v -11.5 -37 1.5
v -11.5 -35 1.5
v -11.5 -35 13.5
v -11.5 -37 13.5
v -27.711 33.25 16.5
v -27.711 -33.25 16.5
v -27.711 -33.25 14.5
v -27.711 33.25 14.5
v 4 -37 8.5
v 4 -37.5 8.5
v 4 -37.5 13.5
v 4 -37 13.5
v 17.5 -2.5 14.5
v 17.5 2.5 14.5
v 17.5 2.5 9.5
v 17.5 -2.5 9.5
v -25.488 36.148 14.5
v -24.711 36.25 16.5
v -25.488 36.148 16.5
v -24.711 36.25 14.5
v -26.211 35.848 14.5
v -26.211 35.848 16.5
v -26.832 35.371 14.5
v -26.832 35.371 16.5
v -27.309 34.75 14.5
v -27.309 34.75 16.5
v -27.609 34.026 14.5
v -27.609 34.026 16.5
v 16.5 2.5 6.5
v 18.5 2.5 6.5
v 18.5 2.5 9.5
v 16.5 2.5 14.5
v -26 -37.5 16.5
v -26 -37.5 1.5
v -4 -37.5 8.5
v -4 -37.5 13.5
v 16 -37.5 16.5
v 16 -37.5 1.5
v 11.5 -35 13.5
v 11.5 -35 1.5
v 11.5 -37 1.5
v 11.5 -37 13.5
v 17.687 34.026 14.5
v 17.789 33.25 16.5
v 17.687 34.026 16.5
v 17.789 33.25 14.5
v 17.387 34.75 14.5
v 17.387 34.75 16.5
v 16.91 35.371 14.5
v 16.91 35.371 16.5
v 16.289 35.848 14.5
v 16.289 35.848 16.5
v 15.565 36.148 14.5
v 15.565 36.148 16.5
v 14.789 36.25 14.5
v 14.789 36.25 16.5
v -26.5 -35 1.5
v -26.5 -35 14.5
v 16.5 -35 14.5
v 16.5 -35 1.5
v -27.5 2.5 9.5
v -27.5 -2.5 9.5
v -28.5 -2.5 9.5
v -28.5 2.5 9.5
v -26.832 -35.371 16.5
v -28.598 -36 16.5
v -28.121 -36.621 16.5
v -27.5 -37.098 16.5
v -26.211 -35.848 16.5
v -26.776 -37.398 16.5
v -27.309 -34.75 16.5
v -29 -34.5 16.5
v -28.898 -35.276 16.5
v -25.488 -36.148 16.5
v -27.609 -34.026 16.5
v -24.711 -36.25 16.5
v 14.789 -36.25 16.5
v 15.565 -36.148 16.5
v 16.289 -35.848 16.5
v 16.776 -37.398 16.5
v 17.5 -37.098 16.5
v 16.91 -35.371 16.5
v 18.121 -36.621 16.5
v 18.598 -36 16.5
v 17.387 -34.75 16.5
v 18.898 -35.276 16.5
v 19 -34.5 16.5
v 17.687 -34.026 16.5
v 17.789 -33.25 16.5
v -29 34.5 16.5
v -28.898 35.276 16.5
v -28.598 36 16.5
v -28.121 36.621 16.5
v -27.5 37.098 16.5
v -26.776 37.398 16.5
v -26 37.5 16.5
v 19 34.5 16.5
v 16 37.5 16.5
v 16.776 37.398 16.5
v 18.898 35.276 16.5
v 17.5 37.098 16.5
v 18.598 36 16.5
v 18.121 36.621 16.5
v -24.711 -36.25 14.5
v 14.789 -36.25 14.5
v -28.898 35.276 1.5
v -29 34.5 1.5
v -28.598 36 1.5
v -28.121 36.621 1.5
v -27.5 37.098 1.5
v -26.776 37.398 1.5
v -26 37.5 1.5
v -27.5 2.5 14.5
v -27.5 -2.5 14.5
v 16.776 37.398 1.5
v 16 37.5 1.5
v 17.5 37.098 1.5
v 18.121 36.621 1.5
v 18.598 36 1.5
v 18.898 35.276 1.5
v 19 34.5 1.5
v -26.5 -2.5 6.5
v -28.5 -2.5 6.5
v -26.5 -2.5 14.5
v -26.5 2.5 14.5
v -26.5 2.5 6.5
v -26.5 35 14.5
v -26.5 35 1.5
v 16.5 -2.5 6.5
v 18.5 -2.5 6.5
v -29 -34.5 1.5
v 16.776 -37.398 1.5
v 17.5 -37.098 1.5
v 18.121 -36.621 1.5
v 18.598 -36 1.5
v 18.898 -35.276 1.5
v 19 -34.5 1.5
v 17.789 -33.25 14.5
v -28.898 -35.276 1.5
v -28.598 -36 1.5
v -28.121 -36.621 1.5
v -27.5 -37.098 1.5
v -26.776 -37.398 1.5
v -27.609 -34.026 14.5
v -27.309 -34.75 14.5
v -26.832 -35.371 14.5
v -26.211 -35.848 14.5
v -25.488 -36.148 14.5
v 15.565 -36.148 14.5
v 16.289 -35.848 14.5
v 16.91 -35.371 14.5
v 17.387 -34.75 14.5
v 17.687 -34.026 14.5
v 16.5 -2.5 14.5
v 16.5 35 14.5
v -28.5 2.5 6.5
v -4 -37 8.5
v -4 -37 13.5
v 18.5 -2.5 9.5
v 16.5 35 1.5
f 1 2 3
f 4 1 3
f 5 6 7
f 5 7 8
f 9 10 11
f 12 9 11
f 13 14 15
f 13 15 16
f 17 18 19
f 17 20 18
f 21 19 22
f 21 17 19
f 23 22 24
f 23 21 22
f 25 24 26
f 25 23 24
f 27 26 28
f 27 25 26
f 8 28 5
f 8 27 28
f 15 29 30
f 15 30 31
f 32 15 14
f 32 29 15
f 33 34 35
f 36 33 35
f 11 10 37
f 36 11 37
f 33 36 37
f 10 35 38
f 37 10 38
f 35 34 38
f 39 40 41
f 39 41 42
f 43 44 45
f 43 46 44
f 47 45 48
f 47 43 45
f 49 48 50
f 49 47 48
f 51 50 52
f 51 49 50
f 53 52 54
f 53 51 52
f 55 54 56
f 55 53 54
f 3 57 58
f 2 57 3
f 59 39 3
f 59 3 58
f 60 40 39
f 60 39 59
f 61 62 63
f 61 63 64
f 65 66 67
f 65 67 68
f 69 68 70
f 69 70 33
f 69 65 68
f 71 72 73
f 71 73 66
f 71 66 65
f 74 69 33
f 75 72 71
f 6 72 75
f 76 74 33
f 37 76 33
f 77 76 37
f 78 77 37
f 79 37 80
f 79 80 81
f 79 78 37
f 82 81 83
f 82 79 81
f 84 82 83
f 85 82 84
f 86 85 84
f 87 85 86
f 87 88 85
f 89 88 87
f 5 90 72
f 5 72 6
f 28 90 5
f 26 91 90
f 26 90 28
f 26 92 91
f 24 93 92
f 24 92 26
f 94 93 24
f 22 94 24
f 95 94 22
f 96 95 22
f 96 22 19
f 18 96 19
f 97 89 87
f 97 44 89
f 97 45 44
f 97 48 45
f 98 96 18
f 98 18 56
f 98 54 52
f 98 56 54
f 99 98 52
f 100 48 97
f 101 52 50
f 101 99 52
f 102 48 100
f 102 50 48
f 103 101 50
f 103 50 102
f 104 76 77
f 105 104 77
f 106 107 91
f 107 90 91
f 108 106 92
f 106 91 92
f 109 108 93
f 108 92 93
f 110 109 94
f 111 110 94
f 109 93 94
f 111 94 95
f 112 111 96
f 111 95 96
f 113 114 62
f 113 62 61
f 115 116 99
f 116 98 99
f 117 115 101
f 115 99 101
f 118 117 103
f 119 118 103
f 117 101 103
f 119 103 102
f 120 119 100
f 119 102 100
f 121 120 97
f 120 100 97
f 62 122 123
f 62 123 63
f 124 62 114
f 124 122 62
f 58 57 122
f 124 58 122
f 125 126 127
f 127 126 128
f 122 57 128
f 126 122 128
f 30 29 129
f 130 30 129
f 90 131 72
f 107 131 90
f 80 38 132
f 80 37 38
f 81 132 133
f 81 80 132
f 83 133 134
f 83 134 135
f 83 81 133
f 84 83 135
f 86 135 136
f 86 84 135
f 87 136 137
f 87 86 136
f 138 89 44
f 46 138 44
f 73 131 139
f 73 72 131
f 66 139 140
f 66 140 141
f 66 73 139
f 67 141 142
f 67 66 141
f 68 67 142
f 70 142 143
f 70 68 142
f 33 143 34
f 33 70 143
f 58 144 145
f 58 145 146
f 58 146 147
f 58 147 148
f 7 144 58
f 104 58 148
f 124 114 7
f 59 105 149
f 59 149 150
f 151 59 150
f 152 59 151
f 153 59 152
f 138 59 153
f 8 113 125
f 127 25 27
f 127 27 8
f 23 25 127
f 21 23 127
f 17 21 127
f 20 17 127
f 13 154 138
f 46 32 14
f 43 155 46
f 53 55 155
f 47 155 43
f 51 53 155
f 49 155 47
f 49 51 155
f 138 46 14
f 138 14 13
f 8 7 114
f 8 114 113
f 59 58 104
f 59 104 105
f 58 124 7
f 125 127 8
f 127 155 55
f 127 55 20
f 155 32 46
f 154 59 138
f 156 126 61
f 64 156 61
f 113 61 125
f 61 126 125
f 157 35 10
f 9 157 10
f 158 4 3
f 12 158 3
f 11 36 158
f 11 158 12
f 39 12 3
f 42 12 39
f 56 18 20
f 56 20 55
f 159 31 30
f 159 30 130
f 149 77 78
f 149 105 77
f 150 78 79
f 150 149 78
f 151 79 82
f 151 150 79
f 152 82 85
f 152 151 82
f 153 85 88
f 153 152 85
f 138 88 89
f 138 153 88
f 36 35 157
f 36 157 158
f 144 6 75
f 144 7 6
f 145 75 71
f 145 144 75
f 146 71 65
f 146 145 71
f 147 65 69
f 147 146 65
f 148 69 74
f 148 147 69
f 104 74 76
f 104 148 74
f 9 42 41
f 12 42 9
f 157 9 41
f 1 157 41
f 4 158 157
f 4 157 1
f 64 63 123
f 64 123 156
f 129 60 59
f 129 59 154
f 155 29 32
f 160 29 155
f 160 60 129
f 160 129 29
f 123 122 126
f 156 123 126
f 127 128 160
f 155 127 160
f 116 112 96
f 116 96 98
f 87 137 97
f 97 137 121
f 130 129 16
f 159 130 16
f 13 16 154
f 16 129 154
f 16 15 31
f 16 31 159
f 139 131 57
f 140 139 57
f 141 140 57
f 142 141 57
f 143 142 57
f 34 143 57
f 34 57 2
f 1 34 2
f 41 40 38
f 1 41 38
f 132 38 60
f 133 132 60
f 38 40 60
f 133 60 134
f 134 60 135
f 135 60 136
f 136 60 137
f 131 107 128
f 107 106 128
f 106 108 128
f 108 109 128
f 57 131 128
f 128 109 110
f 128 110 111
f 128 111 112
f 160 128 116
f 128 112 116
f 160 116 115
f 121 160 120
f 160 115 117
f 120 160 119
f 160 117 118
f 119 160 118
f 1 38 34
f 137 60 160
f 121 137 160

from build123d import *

# Parameters (mm, degrees)
SKETCH004_W     = 48
SKETCH004_H     = 75
SKETCH004_W_2   = 43
SKETCH004_H_2   = 70
PAD002_DEPTH    = 15
SKETCH005_W     = 45.5
SKETCH005_H     = 72.5
POCKET_DEPTH    = 2
FILLET_R        = 3
FILLET001_R     = 3
FILLET002_R     = 3
FILLET003_R     = 3
FILLET004_R     = 3
FILLET005_R     = 3
SKETCH006_W     = 5
SKETCH006_H     = 5
POCKET001_DEPTH = 1
SKETCH007_W     = 5
SKETCH007_H     = 3
POCKET002_DEPTH = 2
SKETCH008_W     = 5
SKETCH008_H     = 5
POCKET003_DEPTH = 1
SKETCH009_W     = 5
SKETCH009_H     = 3
POCKET004_DEPTH = 2
SKETCH011_W     = 23
SKETCH011_H     = 12
POCKET006_DEPTH = 2
SKETCH013_W     = 8
SKETCH013_H     = 5
POCKET008_DEPTH = 5


with BuildPart() as part:
    # Sketch004 → Pad002 (new body)
    with BuildSketch(Plane.XY.offset(1.5)):
        with Locations((-5, 0)):
            Rectangle(SKETCH004_W, SKETCH004_H)
        with Locations((-5, 0)):
            Rectangle(SKETCH004_W_2, SKETCH004_H_2, mode=Mode.SUBTRACT)
    extrude(amount=PAD002_DEPTH)

    # Sketch005 → Pocket (cut)
    with BuildSketch(Plane.XY.offset(16.5)):
        with Locations((-4.9611, 0)):
            Rectangle(SKETCH005_W, SKETCH005_H)
    extrude(amount=-POCKET_DEPTH, mode=Mode.SUBTRACT)

    # Fillet
    fillet_edges = [part.edges().sort_by_distance(p)[0] for p in [
        (-27.7111, 36.25, 15.5),
    ]]
    fillet(fillet_edges, radius=FILLET_R)

    # Fillet001
    fillet001_edges = [part.edges().sort_by_distance(p)[0] for p in [
        (-27.7111, -36.25, 15.5),
    ]]
    fillet(fillet001_edges, radius=FILLET001_R)

    # Fillet002
    fillet002_edges = [part.edges().sort_by_distance(p)[0] for p in [
        (17.7889, -36.25, 15.5),
    ]]
    fillet(fillet002_edges, radius=FILLET002_R)

    # Fillet003
    fillet003_edges = [part.edges().sort_by_distance(p)[0] for p in [
        (17.7889, 36.25, 15.5),
    ]]
    fillet(fillet003_edges, radius=FILLET003_R)

    # Fillet004
    fillet004_edges = [part.edges().sort_by_distance(p)[0] for p in [
        (-29, 37.5, 9),
        (19, 37.5, 9),
    ]]
    fillet(fillet004_edges, radius=FILLET004_R)

    # Fillet005
    fillet005_edges = [part.edges().sort_by_distance(p)[0] for p in [
        (-29, -37.5, 9),
        (19, -37.5, 9),
    ]]
    fillet(fillet005_edges, radius=FILLET005_R)

    # Sketch006 → Pocket001 (cut)
    with BuildSketch(Plane(origin=(-26.5, 0, 1.5), x_dir=(0, 1, 0), z_dir=(1, 0, 0))):
        with Locations((0, 10.5)):
            Rectangle(SKETCH006_W, SKETCH006_H)
    extrude(amount=-POCKET001_DEPTH, mode=Mode.SUBTRACT)

    # Sketch007 → Pocket002 (cut)
    with BuildSketch(Plane(origin=(-26.5, 0, 1.5), x_dir=(0, 1, 0), z_dir=(1, 0, 0))):
        with Locations((0, 6.5)):
            Rectangle(SKETCH007_W, SKETCH007_H)
    extrude(amount=-POCKET002_DEPTH, mode=Mode.SUBTRACT)

    # Sketch008 → Pocket003 (cut)
    with BuildSketch(Plane(origin=(16.5, 0, 1.5), x_dir=(0, -1, 0), z_dir=(-1, 0, 0))):
        with Locations((0, 10.5)):
            Rectangle(SKETCH008_W, SKETCH008_H)
    extrude(amount=-POCKET003_DEPTH, mode=Mode.SUBTRACT)

    # Sketch009 → Pocket004 (cut)
    with BuildSketch(Plane(origin=(16.5, 0, 1.5), x_dir=(0, -1, 0), z_dir=(-1, 0, 0))):
        with Locations((0, 6.5)):
            Rectangle(SKETCH009_W, SKETCH009_H)
    extrude(amount=-POCKET004_DEPTH, mode=Mode.SUBTRACT)

    # Sketch011 → Pocket006 (cut)
    with BuildSketch(Plane(origin=(0, -35, 1.5), x_dir=(-1, 0, 0), z_dir=(0, 1, 0))):
        with Locations((0, 6)):
            Rectangle(SKETCH011_W, SKETCH011_H)
    extrude(amount=-POCKET006_DEPTH, mode=Mode.SUBTRACT)

    # Sketch013 → Pocket008 (cut)
    with BuildSketch(Plane(origin=(0, -37.5, 1.5), x_dir=(1, 0, 0), z_dir=(0, -1, 0))):
        with Locations((0, 9.5)):
            Rectangle(SKETCH013_W, SKETCH013_H)
    extrude(amount=-POCKET008_DEPTH, mode=Mode.SUBTRACT)


solid = part.part
